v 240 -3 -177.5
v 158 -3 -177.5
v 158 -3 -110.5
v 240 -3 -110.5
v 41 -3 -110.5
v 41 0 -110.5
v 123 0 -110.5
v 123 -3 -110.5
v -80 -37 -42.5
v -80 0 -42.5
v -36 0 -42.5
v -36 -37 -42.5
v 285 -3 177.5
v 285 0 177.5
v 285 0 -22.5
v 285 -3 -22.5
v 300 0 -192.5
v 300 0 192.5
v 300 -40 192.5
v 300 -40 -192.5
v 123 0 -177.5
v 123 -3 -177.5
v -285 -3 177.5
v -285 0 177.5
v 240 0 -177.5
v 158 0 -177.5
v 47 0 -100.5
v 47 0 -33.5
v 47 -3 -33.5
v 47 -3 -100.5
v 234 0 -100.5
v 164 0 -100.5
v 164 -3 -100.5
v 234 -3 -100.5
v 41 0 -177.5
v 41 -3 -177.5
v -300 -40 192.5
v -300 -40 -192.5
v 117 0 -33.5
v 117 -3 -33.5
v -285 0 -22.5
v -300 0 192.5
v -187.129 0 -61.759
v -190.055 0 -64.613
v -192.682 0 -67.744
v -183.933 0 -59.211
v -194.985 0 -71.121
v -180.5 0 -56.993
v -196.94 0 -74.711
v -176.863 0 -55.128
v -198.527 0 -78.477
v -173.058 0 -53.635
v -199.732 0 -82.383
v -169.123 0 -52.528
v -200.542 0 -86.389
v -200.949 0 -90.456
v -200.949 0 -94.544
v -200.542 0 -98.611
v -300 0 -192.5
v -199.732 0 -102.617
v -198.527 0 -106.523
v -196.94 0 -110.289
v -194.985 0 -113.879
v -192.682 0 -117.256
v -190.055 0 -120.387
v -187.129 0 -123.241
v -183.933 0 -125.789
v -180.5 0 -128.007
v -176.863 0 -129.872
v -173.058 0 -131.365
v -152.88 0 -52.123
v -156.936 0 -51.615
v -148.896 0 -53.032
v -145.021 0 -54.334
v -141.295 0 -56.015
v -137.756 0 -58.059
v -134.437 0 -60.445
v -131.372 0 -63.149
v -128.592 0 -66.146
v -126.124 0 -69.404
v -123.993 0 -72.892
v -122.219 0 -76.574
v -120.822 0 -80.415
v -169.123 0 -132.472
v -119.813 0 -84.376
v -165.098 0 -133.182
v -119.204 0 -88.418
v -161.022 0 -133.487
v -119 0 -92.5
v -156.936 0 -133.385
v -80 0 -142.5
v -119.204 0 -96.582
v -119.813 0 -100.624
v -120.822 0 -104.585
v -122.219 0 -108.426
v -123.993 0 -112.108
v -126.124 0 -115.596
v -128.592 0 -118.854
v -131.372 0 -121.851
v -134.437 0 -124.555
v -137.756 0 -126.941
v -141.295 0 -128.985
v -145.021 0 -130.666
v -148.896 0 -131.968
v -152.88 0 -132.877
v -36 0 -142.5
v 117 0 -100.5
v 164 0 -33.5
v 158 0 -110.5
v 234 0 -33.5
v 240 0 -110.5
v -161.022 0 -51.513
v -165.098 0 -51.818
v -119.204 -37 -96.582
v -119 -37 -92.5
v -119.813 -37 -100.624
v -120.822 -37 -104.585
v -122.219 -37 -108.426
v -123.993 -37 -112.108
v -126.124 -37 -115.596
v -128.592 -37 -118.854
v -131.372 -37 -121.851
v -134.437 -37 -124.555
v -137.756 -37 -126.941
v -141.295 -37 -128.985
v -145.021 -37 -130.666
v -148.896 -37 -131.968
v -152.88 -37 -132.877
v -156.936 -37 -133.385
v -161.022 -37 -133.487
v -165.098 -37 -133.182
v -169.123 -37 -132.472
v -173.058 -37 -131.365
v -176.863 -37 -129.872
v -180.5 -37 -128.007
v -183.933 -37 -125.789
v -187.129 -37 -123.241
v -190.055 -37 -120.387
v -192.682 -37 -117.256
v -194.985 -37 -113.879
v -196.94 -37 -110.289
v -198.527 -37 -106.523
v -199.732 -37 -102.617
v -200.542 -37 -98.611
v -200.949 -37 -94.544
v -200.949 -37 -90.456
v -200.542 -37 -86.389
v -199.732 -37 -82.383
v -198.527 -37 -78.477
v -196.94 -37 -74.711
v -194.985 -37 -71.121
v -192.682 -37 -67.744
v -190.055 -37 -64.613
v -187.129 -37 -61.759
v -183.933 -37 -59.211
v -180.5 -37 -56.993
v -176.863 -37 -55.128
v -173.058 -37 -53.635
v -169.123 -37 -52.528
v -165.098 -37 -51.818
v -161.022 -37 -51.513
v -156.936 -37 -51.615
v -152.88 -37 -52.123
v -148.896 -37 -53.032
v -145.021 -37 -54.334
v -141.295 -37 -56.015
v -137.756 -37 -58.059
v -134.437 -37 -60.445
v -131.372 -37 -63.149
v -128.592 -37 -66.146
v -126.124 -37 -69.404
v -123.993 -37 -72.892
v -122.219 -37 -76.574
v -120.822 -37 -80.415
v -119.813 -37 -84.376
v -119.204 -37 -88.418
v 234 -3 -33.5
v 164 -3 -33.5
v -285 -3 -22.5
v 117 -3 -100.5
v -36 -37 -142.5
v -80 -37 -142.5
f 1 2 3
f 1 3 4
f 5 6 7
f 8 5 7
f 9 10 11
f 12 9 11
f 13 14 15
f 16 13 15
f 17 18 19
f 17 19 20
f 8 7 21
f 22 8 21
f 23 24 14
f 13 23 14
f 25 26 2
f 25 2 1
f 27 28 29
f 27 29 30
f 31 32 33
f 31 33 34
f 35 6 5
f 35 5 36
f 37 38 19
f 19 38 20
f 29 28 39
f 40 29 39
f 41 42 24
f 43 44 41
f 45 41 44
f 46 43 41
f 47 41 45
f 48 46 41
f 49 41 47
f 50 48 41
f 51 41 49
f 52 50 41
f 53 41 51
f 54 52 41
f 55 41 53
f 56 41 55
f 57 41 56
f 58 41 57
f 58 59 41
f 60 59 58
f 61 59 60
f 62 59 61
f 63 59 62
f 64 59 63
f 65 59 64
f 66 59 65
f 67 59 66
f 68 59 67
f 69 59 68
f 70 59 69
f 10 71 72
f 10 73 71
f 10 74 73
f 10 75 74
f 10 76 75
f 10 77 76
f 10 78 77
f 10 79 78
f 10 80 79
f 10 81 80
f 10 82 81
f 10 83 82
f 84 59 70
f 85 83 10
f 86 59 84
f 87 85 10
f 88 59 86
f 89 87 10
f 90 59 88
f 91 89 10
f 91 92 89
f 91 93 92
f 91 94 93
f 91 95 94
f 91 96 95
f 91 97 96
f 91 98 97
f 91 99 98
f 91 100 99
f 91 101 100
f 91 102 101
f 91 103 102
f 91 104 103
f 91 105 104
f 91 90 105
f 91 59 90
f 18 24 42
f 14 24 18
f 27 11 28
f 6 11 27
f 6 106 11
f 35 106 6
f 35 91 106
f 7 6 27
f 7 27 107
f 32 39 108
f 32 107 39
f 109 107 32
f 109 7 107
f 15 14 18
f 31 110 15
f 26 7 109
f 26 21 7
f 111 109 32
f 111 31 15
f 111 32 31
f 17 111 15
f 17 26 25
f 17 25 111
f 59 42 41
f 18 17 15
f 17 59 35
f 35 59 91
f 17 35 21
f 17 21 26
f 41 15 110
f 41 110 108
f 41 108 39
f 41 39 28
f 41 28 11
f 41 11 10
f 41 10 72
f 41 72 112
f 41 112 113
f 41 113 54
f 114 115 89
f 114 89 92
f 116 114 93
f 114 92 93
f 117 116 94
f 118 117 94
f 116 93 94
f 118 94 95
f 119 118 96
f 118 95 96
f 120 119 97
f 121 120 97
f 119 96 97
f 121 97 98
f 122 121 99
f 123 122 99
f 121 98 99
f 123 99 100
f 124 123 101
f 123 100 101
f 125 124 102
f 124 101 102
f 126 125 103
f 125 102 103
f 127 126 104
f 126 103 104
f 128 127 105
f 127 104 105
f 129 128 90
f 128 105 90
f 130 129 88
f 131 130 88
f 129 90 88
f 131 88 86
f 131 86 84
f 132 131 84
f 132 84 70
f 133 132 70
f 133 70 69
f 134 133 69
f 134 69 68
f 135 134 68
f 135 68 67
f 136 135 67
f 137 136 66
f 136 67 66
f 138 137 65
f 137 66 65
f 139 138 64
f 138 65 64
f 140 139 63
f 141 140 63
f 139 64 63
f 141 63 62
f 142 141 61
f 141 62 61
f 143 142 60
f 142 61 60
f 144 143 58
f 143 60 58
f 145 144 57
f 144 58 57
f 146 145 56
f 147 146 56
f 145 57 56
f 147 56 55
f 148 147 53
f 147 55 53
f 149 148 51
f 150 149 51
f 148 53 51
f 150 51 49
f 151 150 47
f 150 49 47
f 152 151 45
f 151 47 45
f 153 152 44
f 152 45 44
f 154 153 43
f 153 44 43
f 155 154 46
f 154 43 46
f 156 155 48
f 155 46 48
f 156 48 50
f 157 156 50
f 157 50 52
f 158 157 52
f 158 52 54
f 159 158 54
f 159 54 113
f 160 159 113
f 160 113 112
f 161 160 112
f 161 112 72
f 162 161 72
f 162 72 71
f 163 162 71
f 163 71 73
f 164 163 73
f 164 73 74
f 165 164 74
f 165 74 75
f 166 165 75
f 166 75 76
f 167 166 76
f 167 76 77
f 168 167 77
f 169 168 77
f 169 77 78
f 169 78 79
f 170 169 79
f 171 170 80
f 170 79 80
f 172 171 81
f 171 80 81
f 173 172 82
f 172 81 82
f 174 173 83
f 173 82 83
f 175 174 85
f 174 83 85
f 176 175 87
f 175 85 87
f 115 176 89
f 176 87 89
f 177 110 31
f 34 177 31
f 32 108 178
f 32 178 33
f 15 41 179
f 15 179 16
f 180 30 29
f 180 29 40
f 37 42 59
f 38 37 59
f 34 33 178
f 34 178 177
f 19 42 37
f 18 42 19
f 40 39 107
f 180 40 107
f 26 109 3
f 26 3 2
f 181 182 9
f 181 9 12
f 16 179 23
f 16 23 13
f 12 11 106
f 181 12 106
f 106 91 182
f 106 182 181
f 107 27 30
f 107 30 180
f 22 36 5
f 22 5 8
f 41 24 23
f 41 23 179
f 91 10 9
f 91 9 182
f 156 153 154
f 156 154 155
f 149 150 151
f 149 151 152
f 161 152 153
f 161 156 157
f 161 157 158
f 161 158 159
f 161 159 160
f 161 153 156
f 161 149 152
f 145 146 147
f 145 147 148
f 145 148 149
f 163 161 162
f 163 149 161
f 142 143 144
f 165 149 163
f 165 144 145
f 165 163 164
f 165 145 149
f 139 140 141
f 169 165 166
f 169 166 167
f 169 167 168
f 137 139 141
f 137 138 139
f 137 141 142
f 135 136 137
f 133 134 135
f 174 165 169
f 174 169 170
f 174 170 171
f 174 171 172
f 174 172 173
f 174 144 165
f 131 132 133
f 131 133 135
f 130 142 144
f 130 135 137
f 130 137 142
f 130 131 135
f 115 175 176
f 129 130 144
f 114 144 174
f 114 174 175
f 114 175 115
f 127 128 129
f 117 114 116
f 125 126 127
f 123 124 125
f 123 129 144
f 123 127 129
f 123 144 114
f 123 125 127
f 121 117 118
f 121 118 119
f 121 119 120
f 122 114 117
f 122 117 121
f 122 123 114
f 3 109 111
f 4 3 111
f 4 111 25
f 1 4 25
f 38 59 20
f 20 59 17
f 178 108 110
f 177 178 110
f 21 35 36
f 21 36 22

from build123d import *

# Parameters (mm, degrees)
SKETCH1_W           = 600
SKETCH1_H           = 385
BOSS_EXTRUDE1_DEPTH = 40
SKETCH2_W           = 82
SKETCH2_H           = 67
SKETCH2_W_2         = 70
SKETCH2_W_3         = 570
SKETCH2_H_2         = 200
CUT_EXTRUDE1_DEPTH  = 3
SKETCH2_3_R         = 41
SKETCH2_3_W         = 44
SKETCH2_3_H         = 100
CUT_EXTRUDE2_DEPTH  = 37


with BuildPart() as part:
    # Sketch1 → Boss-Extrude1 (new body)
    with BuildSketch(Plane(origin=(0, 0, 0), x_dir=(1, 0, 0), z_dir=(0, 1, 0))):
        Rectangle(SKETCH1_W, SKETCH1_H)
    extrude(amount=-BOSS_EXTRUDE1_DEPTH)

    # Sketch2 → Cut-Extrude1 (cut)
    with BuildSketch(Plane(origin=(0, 0, 0), x_dir=(1, 0, 0), z_dir=(0, 1, 0))):
        with Locations((82, 144)):
            Rectangle(SKETCH2_W, SKETCH2_H)
        with Locations((199, 144)):
            Rectangle(SKETCH2_W, SKETCH2_H)
        with Locations((199, 67)):
            Rectangle(SKETCH2_W_2, SKETCH2_H)
        with Locations((0, -77.5)):
            Rectangle(SKETCH2_W_3, SKETCH2_H_2)
        with Locations((82, 67)):
            Rectangle(SKETCH2_W_2, SKETCH2_H)
    extrude(amount=-CUT_EXTRUDE1_DEPTH, mode=Mode.SUBTRACT)

    # Sketch2<3> → Cut-Extrude2 (cut)
    with BuildSketch(Plane(origin=(0, 0, 0), x_dir=(1, 0, 0), z_dir=(0, 1, 0))):
        with Locations((-160, 92.5)):
            Circle(SKETCH2_3_R)
        with Locations((-58, 92.5)):
            Rectangle(SKETCH2_3_W, SKETCH2_3_H)
    extrude(amount=-CUT_EXTRUDE2_DEPTH, mode=Mode.SUBTRACT)


solid = part.part
